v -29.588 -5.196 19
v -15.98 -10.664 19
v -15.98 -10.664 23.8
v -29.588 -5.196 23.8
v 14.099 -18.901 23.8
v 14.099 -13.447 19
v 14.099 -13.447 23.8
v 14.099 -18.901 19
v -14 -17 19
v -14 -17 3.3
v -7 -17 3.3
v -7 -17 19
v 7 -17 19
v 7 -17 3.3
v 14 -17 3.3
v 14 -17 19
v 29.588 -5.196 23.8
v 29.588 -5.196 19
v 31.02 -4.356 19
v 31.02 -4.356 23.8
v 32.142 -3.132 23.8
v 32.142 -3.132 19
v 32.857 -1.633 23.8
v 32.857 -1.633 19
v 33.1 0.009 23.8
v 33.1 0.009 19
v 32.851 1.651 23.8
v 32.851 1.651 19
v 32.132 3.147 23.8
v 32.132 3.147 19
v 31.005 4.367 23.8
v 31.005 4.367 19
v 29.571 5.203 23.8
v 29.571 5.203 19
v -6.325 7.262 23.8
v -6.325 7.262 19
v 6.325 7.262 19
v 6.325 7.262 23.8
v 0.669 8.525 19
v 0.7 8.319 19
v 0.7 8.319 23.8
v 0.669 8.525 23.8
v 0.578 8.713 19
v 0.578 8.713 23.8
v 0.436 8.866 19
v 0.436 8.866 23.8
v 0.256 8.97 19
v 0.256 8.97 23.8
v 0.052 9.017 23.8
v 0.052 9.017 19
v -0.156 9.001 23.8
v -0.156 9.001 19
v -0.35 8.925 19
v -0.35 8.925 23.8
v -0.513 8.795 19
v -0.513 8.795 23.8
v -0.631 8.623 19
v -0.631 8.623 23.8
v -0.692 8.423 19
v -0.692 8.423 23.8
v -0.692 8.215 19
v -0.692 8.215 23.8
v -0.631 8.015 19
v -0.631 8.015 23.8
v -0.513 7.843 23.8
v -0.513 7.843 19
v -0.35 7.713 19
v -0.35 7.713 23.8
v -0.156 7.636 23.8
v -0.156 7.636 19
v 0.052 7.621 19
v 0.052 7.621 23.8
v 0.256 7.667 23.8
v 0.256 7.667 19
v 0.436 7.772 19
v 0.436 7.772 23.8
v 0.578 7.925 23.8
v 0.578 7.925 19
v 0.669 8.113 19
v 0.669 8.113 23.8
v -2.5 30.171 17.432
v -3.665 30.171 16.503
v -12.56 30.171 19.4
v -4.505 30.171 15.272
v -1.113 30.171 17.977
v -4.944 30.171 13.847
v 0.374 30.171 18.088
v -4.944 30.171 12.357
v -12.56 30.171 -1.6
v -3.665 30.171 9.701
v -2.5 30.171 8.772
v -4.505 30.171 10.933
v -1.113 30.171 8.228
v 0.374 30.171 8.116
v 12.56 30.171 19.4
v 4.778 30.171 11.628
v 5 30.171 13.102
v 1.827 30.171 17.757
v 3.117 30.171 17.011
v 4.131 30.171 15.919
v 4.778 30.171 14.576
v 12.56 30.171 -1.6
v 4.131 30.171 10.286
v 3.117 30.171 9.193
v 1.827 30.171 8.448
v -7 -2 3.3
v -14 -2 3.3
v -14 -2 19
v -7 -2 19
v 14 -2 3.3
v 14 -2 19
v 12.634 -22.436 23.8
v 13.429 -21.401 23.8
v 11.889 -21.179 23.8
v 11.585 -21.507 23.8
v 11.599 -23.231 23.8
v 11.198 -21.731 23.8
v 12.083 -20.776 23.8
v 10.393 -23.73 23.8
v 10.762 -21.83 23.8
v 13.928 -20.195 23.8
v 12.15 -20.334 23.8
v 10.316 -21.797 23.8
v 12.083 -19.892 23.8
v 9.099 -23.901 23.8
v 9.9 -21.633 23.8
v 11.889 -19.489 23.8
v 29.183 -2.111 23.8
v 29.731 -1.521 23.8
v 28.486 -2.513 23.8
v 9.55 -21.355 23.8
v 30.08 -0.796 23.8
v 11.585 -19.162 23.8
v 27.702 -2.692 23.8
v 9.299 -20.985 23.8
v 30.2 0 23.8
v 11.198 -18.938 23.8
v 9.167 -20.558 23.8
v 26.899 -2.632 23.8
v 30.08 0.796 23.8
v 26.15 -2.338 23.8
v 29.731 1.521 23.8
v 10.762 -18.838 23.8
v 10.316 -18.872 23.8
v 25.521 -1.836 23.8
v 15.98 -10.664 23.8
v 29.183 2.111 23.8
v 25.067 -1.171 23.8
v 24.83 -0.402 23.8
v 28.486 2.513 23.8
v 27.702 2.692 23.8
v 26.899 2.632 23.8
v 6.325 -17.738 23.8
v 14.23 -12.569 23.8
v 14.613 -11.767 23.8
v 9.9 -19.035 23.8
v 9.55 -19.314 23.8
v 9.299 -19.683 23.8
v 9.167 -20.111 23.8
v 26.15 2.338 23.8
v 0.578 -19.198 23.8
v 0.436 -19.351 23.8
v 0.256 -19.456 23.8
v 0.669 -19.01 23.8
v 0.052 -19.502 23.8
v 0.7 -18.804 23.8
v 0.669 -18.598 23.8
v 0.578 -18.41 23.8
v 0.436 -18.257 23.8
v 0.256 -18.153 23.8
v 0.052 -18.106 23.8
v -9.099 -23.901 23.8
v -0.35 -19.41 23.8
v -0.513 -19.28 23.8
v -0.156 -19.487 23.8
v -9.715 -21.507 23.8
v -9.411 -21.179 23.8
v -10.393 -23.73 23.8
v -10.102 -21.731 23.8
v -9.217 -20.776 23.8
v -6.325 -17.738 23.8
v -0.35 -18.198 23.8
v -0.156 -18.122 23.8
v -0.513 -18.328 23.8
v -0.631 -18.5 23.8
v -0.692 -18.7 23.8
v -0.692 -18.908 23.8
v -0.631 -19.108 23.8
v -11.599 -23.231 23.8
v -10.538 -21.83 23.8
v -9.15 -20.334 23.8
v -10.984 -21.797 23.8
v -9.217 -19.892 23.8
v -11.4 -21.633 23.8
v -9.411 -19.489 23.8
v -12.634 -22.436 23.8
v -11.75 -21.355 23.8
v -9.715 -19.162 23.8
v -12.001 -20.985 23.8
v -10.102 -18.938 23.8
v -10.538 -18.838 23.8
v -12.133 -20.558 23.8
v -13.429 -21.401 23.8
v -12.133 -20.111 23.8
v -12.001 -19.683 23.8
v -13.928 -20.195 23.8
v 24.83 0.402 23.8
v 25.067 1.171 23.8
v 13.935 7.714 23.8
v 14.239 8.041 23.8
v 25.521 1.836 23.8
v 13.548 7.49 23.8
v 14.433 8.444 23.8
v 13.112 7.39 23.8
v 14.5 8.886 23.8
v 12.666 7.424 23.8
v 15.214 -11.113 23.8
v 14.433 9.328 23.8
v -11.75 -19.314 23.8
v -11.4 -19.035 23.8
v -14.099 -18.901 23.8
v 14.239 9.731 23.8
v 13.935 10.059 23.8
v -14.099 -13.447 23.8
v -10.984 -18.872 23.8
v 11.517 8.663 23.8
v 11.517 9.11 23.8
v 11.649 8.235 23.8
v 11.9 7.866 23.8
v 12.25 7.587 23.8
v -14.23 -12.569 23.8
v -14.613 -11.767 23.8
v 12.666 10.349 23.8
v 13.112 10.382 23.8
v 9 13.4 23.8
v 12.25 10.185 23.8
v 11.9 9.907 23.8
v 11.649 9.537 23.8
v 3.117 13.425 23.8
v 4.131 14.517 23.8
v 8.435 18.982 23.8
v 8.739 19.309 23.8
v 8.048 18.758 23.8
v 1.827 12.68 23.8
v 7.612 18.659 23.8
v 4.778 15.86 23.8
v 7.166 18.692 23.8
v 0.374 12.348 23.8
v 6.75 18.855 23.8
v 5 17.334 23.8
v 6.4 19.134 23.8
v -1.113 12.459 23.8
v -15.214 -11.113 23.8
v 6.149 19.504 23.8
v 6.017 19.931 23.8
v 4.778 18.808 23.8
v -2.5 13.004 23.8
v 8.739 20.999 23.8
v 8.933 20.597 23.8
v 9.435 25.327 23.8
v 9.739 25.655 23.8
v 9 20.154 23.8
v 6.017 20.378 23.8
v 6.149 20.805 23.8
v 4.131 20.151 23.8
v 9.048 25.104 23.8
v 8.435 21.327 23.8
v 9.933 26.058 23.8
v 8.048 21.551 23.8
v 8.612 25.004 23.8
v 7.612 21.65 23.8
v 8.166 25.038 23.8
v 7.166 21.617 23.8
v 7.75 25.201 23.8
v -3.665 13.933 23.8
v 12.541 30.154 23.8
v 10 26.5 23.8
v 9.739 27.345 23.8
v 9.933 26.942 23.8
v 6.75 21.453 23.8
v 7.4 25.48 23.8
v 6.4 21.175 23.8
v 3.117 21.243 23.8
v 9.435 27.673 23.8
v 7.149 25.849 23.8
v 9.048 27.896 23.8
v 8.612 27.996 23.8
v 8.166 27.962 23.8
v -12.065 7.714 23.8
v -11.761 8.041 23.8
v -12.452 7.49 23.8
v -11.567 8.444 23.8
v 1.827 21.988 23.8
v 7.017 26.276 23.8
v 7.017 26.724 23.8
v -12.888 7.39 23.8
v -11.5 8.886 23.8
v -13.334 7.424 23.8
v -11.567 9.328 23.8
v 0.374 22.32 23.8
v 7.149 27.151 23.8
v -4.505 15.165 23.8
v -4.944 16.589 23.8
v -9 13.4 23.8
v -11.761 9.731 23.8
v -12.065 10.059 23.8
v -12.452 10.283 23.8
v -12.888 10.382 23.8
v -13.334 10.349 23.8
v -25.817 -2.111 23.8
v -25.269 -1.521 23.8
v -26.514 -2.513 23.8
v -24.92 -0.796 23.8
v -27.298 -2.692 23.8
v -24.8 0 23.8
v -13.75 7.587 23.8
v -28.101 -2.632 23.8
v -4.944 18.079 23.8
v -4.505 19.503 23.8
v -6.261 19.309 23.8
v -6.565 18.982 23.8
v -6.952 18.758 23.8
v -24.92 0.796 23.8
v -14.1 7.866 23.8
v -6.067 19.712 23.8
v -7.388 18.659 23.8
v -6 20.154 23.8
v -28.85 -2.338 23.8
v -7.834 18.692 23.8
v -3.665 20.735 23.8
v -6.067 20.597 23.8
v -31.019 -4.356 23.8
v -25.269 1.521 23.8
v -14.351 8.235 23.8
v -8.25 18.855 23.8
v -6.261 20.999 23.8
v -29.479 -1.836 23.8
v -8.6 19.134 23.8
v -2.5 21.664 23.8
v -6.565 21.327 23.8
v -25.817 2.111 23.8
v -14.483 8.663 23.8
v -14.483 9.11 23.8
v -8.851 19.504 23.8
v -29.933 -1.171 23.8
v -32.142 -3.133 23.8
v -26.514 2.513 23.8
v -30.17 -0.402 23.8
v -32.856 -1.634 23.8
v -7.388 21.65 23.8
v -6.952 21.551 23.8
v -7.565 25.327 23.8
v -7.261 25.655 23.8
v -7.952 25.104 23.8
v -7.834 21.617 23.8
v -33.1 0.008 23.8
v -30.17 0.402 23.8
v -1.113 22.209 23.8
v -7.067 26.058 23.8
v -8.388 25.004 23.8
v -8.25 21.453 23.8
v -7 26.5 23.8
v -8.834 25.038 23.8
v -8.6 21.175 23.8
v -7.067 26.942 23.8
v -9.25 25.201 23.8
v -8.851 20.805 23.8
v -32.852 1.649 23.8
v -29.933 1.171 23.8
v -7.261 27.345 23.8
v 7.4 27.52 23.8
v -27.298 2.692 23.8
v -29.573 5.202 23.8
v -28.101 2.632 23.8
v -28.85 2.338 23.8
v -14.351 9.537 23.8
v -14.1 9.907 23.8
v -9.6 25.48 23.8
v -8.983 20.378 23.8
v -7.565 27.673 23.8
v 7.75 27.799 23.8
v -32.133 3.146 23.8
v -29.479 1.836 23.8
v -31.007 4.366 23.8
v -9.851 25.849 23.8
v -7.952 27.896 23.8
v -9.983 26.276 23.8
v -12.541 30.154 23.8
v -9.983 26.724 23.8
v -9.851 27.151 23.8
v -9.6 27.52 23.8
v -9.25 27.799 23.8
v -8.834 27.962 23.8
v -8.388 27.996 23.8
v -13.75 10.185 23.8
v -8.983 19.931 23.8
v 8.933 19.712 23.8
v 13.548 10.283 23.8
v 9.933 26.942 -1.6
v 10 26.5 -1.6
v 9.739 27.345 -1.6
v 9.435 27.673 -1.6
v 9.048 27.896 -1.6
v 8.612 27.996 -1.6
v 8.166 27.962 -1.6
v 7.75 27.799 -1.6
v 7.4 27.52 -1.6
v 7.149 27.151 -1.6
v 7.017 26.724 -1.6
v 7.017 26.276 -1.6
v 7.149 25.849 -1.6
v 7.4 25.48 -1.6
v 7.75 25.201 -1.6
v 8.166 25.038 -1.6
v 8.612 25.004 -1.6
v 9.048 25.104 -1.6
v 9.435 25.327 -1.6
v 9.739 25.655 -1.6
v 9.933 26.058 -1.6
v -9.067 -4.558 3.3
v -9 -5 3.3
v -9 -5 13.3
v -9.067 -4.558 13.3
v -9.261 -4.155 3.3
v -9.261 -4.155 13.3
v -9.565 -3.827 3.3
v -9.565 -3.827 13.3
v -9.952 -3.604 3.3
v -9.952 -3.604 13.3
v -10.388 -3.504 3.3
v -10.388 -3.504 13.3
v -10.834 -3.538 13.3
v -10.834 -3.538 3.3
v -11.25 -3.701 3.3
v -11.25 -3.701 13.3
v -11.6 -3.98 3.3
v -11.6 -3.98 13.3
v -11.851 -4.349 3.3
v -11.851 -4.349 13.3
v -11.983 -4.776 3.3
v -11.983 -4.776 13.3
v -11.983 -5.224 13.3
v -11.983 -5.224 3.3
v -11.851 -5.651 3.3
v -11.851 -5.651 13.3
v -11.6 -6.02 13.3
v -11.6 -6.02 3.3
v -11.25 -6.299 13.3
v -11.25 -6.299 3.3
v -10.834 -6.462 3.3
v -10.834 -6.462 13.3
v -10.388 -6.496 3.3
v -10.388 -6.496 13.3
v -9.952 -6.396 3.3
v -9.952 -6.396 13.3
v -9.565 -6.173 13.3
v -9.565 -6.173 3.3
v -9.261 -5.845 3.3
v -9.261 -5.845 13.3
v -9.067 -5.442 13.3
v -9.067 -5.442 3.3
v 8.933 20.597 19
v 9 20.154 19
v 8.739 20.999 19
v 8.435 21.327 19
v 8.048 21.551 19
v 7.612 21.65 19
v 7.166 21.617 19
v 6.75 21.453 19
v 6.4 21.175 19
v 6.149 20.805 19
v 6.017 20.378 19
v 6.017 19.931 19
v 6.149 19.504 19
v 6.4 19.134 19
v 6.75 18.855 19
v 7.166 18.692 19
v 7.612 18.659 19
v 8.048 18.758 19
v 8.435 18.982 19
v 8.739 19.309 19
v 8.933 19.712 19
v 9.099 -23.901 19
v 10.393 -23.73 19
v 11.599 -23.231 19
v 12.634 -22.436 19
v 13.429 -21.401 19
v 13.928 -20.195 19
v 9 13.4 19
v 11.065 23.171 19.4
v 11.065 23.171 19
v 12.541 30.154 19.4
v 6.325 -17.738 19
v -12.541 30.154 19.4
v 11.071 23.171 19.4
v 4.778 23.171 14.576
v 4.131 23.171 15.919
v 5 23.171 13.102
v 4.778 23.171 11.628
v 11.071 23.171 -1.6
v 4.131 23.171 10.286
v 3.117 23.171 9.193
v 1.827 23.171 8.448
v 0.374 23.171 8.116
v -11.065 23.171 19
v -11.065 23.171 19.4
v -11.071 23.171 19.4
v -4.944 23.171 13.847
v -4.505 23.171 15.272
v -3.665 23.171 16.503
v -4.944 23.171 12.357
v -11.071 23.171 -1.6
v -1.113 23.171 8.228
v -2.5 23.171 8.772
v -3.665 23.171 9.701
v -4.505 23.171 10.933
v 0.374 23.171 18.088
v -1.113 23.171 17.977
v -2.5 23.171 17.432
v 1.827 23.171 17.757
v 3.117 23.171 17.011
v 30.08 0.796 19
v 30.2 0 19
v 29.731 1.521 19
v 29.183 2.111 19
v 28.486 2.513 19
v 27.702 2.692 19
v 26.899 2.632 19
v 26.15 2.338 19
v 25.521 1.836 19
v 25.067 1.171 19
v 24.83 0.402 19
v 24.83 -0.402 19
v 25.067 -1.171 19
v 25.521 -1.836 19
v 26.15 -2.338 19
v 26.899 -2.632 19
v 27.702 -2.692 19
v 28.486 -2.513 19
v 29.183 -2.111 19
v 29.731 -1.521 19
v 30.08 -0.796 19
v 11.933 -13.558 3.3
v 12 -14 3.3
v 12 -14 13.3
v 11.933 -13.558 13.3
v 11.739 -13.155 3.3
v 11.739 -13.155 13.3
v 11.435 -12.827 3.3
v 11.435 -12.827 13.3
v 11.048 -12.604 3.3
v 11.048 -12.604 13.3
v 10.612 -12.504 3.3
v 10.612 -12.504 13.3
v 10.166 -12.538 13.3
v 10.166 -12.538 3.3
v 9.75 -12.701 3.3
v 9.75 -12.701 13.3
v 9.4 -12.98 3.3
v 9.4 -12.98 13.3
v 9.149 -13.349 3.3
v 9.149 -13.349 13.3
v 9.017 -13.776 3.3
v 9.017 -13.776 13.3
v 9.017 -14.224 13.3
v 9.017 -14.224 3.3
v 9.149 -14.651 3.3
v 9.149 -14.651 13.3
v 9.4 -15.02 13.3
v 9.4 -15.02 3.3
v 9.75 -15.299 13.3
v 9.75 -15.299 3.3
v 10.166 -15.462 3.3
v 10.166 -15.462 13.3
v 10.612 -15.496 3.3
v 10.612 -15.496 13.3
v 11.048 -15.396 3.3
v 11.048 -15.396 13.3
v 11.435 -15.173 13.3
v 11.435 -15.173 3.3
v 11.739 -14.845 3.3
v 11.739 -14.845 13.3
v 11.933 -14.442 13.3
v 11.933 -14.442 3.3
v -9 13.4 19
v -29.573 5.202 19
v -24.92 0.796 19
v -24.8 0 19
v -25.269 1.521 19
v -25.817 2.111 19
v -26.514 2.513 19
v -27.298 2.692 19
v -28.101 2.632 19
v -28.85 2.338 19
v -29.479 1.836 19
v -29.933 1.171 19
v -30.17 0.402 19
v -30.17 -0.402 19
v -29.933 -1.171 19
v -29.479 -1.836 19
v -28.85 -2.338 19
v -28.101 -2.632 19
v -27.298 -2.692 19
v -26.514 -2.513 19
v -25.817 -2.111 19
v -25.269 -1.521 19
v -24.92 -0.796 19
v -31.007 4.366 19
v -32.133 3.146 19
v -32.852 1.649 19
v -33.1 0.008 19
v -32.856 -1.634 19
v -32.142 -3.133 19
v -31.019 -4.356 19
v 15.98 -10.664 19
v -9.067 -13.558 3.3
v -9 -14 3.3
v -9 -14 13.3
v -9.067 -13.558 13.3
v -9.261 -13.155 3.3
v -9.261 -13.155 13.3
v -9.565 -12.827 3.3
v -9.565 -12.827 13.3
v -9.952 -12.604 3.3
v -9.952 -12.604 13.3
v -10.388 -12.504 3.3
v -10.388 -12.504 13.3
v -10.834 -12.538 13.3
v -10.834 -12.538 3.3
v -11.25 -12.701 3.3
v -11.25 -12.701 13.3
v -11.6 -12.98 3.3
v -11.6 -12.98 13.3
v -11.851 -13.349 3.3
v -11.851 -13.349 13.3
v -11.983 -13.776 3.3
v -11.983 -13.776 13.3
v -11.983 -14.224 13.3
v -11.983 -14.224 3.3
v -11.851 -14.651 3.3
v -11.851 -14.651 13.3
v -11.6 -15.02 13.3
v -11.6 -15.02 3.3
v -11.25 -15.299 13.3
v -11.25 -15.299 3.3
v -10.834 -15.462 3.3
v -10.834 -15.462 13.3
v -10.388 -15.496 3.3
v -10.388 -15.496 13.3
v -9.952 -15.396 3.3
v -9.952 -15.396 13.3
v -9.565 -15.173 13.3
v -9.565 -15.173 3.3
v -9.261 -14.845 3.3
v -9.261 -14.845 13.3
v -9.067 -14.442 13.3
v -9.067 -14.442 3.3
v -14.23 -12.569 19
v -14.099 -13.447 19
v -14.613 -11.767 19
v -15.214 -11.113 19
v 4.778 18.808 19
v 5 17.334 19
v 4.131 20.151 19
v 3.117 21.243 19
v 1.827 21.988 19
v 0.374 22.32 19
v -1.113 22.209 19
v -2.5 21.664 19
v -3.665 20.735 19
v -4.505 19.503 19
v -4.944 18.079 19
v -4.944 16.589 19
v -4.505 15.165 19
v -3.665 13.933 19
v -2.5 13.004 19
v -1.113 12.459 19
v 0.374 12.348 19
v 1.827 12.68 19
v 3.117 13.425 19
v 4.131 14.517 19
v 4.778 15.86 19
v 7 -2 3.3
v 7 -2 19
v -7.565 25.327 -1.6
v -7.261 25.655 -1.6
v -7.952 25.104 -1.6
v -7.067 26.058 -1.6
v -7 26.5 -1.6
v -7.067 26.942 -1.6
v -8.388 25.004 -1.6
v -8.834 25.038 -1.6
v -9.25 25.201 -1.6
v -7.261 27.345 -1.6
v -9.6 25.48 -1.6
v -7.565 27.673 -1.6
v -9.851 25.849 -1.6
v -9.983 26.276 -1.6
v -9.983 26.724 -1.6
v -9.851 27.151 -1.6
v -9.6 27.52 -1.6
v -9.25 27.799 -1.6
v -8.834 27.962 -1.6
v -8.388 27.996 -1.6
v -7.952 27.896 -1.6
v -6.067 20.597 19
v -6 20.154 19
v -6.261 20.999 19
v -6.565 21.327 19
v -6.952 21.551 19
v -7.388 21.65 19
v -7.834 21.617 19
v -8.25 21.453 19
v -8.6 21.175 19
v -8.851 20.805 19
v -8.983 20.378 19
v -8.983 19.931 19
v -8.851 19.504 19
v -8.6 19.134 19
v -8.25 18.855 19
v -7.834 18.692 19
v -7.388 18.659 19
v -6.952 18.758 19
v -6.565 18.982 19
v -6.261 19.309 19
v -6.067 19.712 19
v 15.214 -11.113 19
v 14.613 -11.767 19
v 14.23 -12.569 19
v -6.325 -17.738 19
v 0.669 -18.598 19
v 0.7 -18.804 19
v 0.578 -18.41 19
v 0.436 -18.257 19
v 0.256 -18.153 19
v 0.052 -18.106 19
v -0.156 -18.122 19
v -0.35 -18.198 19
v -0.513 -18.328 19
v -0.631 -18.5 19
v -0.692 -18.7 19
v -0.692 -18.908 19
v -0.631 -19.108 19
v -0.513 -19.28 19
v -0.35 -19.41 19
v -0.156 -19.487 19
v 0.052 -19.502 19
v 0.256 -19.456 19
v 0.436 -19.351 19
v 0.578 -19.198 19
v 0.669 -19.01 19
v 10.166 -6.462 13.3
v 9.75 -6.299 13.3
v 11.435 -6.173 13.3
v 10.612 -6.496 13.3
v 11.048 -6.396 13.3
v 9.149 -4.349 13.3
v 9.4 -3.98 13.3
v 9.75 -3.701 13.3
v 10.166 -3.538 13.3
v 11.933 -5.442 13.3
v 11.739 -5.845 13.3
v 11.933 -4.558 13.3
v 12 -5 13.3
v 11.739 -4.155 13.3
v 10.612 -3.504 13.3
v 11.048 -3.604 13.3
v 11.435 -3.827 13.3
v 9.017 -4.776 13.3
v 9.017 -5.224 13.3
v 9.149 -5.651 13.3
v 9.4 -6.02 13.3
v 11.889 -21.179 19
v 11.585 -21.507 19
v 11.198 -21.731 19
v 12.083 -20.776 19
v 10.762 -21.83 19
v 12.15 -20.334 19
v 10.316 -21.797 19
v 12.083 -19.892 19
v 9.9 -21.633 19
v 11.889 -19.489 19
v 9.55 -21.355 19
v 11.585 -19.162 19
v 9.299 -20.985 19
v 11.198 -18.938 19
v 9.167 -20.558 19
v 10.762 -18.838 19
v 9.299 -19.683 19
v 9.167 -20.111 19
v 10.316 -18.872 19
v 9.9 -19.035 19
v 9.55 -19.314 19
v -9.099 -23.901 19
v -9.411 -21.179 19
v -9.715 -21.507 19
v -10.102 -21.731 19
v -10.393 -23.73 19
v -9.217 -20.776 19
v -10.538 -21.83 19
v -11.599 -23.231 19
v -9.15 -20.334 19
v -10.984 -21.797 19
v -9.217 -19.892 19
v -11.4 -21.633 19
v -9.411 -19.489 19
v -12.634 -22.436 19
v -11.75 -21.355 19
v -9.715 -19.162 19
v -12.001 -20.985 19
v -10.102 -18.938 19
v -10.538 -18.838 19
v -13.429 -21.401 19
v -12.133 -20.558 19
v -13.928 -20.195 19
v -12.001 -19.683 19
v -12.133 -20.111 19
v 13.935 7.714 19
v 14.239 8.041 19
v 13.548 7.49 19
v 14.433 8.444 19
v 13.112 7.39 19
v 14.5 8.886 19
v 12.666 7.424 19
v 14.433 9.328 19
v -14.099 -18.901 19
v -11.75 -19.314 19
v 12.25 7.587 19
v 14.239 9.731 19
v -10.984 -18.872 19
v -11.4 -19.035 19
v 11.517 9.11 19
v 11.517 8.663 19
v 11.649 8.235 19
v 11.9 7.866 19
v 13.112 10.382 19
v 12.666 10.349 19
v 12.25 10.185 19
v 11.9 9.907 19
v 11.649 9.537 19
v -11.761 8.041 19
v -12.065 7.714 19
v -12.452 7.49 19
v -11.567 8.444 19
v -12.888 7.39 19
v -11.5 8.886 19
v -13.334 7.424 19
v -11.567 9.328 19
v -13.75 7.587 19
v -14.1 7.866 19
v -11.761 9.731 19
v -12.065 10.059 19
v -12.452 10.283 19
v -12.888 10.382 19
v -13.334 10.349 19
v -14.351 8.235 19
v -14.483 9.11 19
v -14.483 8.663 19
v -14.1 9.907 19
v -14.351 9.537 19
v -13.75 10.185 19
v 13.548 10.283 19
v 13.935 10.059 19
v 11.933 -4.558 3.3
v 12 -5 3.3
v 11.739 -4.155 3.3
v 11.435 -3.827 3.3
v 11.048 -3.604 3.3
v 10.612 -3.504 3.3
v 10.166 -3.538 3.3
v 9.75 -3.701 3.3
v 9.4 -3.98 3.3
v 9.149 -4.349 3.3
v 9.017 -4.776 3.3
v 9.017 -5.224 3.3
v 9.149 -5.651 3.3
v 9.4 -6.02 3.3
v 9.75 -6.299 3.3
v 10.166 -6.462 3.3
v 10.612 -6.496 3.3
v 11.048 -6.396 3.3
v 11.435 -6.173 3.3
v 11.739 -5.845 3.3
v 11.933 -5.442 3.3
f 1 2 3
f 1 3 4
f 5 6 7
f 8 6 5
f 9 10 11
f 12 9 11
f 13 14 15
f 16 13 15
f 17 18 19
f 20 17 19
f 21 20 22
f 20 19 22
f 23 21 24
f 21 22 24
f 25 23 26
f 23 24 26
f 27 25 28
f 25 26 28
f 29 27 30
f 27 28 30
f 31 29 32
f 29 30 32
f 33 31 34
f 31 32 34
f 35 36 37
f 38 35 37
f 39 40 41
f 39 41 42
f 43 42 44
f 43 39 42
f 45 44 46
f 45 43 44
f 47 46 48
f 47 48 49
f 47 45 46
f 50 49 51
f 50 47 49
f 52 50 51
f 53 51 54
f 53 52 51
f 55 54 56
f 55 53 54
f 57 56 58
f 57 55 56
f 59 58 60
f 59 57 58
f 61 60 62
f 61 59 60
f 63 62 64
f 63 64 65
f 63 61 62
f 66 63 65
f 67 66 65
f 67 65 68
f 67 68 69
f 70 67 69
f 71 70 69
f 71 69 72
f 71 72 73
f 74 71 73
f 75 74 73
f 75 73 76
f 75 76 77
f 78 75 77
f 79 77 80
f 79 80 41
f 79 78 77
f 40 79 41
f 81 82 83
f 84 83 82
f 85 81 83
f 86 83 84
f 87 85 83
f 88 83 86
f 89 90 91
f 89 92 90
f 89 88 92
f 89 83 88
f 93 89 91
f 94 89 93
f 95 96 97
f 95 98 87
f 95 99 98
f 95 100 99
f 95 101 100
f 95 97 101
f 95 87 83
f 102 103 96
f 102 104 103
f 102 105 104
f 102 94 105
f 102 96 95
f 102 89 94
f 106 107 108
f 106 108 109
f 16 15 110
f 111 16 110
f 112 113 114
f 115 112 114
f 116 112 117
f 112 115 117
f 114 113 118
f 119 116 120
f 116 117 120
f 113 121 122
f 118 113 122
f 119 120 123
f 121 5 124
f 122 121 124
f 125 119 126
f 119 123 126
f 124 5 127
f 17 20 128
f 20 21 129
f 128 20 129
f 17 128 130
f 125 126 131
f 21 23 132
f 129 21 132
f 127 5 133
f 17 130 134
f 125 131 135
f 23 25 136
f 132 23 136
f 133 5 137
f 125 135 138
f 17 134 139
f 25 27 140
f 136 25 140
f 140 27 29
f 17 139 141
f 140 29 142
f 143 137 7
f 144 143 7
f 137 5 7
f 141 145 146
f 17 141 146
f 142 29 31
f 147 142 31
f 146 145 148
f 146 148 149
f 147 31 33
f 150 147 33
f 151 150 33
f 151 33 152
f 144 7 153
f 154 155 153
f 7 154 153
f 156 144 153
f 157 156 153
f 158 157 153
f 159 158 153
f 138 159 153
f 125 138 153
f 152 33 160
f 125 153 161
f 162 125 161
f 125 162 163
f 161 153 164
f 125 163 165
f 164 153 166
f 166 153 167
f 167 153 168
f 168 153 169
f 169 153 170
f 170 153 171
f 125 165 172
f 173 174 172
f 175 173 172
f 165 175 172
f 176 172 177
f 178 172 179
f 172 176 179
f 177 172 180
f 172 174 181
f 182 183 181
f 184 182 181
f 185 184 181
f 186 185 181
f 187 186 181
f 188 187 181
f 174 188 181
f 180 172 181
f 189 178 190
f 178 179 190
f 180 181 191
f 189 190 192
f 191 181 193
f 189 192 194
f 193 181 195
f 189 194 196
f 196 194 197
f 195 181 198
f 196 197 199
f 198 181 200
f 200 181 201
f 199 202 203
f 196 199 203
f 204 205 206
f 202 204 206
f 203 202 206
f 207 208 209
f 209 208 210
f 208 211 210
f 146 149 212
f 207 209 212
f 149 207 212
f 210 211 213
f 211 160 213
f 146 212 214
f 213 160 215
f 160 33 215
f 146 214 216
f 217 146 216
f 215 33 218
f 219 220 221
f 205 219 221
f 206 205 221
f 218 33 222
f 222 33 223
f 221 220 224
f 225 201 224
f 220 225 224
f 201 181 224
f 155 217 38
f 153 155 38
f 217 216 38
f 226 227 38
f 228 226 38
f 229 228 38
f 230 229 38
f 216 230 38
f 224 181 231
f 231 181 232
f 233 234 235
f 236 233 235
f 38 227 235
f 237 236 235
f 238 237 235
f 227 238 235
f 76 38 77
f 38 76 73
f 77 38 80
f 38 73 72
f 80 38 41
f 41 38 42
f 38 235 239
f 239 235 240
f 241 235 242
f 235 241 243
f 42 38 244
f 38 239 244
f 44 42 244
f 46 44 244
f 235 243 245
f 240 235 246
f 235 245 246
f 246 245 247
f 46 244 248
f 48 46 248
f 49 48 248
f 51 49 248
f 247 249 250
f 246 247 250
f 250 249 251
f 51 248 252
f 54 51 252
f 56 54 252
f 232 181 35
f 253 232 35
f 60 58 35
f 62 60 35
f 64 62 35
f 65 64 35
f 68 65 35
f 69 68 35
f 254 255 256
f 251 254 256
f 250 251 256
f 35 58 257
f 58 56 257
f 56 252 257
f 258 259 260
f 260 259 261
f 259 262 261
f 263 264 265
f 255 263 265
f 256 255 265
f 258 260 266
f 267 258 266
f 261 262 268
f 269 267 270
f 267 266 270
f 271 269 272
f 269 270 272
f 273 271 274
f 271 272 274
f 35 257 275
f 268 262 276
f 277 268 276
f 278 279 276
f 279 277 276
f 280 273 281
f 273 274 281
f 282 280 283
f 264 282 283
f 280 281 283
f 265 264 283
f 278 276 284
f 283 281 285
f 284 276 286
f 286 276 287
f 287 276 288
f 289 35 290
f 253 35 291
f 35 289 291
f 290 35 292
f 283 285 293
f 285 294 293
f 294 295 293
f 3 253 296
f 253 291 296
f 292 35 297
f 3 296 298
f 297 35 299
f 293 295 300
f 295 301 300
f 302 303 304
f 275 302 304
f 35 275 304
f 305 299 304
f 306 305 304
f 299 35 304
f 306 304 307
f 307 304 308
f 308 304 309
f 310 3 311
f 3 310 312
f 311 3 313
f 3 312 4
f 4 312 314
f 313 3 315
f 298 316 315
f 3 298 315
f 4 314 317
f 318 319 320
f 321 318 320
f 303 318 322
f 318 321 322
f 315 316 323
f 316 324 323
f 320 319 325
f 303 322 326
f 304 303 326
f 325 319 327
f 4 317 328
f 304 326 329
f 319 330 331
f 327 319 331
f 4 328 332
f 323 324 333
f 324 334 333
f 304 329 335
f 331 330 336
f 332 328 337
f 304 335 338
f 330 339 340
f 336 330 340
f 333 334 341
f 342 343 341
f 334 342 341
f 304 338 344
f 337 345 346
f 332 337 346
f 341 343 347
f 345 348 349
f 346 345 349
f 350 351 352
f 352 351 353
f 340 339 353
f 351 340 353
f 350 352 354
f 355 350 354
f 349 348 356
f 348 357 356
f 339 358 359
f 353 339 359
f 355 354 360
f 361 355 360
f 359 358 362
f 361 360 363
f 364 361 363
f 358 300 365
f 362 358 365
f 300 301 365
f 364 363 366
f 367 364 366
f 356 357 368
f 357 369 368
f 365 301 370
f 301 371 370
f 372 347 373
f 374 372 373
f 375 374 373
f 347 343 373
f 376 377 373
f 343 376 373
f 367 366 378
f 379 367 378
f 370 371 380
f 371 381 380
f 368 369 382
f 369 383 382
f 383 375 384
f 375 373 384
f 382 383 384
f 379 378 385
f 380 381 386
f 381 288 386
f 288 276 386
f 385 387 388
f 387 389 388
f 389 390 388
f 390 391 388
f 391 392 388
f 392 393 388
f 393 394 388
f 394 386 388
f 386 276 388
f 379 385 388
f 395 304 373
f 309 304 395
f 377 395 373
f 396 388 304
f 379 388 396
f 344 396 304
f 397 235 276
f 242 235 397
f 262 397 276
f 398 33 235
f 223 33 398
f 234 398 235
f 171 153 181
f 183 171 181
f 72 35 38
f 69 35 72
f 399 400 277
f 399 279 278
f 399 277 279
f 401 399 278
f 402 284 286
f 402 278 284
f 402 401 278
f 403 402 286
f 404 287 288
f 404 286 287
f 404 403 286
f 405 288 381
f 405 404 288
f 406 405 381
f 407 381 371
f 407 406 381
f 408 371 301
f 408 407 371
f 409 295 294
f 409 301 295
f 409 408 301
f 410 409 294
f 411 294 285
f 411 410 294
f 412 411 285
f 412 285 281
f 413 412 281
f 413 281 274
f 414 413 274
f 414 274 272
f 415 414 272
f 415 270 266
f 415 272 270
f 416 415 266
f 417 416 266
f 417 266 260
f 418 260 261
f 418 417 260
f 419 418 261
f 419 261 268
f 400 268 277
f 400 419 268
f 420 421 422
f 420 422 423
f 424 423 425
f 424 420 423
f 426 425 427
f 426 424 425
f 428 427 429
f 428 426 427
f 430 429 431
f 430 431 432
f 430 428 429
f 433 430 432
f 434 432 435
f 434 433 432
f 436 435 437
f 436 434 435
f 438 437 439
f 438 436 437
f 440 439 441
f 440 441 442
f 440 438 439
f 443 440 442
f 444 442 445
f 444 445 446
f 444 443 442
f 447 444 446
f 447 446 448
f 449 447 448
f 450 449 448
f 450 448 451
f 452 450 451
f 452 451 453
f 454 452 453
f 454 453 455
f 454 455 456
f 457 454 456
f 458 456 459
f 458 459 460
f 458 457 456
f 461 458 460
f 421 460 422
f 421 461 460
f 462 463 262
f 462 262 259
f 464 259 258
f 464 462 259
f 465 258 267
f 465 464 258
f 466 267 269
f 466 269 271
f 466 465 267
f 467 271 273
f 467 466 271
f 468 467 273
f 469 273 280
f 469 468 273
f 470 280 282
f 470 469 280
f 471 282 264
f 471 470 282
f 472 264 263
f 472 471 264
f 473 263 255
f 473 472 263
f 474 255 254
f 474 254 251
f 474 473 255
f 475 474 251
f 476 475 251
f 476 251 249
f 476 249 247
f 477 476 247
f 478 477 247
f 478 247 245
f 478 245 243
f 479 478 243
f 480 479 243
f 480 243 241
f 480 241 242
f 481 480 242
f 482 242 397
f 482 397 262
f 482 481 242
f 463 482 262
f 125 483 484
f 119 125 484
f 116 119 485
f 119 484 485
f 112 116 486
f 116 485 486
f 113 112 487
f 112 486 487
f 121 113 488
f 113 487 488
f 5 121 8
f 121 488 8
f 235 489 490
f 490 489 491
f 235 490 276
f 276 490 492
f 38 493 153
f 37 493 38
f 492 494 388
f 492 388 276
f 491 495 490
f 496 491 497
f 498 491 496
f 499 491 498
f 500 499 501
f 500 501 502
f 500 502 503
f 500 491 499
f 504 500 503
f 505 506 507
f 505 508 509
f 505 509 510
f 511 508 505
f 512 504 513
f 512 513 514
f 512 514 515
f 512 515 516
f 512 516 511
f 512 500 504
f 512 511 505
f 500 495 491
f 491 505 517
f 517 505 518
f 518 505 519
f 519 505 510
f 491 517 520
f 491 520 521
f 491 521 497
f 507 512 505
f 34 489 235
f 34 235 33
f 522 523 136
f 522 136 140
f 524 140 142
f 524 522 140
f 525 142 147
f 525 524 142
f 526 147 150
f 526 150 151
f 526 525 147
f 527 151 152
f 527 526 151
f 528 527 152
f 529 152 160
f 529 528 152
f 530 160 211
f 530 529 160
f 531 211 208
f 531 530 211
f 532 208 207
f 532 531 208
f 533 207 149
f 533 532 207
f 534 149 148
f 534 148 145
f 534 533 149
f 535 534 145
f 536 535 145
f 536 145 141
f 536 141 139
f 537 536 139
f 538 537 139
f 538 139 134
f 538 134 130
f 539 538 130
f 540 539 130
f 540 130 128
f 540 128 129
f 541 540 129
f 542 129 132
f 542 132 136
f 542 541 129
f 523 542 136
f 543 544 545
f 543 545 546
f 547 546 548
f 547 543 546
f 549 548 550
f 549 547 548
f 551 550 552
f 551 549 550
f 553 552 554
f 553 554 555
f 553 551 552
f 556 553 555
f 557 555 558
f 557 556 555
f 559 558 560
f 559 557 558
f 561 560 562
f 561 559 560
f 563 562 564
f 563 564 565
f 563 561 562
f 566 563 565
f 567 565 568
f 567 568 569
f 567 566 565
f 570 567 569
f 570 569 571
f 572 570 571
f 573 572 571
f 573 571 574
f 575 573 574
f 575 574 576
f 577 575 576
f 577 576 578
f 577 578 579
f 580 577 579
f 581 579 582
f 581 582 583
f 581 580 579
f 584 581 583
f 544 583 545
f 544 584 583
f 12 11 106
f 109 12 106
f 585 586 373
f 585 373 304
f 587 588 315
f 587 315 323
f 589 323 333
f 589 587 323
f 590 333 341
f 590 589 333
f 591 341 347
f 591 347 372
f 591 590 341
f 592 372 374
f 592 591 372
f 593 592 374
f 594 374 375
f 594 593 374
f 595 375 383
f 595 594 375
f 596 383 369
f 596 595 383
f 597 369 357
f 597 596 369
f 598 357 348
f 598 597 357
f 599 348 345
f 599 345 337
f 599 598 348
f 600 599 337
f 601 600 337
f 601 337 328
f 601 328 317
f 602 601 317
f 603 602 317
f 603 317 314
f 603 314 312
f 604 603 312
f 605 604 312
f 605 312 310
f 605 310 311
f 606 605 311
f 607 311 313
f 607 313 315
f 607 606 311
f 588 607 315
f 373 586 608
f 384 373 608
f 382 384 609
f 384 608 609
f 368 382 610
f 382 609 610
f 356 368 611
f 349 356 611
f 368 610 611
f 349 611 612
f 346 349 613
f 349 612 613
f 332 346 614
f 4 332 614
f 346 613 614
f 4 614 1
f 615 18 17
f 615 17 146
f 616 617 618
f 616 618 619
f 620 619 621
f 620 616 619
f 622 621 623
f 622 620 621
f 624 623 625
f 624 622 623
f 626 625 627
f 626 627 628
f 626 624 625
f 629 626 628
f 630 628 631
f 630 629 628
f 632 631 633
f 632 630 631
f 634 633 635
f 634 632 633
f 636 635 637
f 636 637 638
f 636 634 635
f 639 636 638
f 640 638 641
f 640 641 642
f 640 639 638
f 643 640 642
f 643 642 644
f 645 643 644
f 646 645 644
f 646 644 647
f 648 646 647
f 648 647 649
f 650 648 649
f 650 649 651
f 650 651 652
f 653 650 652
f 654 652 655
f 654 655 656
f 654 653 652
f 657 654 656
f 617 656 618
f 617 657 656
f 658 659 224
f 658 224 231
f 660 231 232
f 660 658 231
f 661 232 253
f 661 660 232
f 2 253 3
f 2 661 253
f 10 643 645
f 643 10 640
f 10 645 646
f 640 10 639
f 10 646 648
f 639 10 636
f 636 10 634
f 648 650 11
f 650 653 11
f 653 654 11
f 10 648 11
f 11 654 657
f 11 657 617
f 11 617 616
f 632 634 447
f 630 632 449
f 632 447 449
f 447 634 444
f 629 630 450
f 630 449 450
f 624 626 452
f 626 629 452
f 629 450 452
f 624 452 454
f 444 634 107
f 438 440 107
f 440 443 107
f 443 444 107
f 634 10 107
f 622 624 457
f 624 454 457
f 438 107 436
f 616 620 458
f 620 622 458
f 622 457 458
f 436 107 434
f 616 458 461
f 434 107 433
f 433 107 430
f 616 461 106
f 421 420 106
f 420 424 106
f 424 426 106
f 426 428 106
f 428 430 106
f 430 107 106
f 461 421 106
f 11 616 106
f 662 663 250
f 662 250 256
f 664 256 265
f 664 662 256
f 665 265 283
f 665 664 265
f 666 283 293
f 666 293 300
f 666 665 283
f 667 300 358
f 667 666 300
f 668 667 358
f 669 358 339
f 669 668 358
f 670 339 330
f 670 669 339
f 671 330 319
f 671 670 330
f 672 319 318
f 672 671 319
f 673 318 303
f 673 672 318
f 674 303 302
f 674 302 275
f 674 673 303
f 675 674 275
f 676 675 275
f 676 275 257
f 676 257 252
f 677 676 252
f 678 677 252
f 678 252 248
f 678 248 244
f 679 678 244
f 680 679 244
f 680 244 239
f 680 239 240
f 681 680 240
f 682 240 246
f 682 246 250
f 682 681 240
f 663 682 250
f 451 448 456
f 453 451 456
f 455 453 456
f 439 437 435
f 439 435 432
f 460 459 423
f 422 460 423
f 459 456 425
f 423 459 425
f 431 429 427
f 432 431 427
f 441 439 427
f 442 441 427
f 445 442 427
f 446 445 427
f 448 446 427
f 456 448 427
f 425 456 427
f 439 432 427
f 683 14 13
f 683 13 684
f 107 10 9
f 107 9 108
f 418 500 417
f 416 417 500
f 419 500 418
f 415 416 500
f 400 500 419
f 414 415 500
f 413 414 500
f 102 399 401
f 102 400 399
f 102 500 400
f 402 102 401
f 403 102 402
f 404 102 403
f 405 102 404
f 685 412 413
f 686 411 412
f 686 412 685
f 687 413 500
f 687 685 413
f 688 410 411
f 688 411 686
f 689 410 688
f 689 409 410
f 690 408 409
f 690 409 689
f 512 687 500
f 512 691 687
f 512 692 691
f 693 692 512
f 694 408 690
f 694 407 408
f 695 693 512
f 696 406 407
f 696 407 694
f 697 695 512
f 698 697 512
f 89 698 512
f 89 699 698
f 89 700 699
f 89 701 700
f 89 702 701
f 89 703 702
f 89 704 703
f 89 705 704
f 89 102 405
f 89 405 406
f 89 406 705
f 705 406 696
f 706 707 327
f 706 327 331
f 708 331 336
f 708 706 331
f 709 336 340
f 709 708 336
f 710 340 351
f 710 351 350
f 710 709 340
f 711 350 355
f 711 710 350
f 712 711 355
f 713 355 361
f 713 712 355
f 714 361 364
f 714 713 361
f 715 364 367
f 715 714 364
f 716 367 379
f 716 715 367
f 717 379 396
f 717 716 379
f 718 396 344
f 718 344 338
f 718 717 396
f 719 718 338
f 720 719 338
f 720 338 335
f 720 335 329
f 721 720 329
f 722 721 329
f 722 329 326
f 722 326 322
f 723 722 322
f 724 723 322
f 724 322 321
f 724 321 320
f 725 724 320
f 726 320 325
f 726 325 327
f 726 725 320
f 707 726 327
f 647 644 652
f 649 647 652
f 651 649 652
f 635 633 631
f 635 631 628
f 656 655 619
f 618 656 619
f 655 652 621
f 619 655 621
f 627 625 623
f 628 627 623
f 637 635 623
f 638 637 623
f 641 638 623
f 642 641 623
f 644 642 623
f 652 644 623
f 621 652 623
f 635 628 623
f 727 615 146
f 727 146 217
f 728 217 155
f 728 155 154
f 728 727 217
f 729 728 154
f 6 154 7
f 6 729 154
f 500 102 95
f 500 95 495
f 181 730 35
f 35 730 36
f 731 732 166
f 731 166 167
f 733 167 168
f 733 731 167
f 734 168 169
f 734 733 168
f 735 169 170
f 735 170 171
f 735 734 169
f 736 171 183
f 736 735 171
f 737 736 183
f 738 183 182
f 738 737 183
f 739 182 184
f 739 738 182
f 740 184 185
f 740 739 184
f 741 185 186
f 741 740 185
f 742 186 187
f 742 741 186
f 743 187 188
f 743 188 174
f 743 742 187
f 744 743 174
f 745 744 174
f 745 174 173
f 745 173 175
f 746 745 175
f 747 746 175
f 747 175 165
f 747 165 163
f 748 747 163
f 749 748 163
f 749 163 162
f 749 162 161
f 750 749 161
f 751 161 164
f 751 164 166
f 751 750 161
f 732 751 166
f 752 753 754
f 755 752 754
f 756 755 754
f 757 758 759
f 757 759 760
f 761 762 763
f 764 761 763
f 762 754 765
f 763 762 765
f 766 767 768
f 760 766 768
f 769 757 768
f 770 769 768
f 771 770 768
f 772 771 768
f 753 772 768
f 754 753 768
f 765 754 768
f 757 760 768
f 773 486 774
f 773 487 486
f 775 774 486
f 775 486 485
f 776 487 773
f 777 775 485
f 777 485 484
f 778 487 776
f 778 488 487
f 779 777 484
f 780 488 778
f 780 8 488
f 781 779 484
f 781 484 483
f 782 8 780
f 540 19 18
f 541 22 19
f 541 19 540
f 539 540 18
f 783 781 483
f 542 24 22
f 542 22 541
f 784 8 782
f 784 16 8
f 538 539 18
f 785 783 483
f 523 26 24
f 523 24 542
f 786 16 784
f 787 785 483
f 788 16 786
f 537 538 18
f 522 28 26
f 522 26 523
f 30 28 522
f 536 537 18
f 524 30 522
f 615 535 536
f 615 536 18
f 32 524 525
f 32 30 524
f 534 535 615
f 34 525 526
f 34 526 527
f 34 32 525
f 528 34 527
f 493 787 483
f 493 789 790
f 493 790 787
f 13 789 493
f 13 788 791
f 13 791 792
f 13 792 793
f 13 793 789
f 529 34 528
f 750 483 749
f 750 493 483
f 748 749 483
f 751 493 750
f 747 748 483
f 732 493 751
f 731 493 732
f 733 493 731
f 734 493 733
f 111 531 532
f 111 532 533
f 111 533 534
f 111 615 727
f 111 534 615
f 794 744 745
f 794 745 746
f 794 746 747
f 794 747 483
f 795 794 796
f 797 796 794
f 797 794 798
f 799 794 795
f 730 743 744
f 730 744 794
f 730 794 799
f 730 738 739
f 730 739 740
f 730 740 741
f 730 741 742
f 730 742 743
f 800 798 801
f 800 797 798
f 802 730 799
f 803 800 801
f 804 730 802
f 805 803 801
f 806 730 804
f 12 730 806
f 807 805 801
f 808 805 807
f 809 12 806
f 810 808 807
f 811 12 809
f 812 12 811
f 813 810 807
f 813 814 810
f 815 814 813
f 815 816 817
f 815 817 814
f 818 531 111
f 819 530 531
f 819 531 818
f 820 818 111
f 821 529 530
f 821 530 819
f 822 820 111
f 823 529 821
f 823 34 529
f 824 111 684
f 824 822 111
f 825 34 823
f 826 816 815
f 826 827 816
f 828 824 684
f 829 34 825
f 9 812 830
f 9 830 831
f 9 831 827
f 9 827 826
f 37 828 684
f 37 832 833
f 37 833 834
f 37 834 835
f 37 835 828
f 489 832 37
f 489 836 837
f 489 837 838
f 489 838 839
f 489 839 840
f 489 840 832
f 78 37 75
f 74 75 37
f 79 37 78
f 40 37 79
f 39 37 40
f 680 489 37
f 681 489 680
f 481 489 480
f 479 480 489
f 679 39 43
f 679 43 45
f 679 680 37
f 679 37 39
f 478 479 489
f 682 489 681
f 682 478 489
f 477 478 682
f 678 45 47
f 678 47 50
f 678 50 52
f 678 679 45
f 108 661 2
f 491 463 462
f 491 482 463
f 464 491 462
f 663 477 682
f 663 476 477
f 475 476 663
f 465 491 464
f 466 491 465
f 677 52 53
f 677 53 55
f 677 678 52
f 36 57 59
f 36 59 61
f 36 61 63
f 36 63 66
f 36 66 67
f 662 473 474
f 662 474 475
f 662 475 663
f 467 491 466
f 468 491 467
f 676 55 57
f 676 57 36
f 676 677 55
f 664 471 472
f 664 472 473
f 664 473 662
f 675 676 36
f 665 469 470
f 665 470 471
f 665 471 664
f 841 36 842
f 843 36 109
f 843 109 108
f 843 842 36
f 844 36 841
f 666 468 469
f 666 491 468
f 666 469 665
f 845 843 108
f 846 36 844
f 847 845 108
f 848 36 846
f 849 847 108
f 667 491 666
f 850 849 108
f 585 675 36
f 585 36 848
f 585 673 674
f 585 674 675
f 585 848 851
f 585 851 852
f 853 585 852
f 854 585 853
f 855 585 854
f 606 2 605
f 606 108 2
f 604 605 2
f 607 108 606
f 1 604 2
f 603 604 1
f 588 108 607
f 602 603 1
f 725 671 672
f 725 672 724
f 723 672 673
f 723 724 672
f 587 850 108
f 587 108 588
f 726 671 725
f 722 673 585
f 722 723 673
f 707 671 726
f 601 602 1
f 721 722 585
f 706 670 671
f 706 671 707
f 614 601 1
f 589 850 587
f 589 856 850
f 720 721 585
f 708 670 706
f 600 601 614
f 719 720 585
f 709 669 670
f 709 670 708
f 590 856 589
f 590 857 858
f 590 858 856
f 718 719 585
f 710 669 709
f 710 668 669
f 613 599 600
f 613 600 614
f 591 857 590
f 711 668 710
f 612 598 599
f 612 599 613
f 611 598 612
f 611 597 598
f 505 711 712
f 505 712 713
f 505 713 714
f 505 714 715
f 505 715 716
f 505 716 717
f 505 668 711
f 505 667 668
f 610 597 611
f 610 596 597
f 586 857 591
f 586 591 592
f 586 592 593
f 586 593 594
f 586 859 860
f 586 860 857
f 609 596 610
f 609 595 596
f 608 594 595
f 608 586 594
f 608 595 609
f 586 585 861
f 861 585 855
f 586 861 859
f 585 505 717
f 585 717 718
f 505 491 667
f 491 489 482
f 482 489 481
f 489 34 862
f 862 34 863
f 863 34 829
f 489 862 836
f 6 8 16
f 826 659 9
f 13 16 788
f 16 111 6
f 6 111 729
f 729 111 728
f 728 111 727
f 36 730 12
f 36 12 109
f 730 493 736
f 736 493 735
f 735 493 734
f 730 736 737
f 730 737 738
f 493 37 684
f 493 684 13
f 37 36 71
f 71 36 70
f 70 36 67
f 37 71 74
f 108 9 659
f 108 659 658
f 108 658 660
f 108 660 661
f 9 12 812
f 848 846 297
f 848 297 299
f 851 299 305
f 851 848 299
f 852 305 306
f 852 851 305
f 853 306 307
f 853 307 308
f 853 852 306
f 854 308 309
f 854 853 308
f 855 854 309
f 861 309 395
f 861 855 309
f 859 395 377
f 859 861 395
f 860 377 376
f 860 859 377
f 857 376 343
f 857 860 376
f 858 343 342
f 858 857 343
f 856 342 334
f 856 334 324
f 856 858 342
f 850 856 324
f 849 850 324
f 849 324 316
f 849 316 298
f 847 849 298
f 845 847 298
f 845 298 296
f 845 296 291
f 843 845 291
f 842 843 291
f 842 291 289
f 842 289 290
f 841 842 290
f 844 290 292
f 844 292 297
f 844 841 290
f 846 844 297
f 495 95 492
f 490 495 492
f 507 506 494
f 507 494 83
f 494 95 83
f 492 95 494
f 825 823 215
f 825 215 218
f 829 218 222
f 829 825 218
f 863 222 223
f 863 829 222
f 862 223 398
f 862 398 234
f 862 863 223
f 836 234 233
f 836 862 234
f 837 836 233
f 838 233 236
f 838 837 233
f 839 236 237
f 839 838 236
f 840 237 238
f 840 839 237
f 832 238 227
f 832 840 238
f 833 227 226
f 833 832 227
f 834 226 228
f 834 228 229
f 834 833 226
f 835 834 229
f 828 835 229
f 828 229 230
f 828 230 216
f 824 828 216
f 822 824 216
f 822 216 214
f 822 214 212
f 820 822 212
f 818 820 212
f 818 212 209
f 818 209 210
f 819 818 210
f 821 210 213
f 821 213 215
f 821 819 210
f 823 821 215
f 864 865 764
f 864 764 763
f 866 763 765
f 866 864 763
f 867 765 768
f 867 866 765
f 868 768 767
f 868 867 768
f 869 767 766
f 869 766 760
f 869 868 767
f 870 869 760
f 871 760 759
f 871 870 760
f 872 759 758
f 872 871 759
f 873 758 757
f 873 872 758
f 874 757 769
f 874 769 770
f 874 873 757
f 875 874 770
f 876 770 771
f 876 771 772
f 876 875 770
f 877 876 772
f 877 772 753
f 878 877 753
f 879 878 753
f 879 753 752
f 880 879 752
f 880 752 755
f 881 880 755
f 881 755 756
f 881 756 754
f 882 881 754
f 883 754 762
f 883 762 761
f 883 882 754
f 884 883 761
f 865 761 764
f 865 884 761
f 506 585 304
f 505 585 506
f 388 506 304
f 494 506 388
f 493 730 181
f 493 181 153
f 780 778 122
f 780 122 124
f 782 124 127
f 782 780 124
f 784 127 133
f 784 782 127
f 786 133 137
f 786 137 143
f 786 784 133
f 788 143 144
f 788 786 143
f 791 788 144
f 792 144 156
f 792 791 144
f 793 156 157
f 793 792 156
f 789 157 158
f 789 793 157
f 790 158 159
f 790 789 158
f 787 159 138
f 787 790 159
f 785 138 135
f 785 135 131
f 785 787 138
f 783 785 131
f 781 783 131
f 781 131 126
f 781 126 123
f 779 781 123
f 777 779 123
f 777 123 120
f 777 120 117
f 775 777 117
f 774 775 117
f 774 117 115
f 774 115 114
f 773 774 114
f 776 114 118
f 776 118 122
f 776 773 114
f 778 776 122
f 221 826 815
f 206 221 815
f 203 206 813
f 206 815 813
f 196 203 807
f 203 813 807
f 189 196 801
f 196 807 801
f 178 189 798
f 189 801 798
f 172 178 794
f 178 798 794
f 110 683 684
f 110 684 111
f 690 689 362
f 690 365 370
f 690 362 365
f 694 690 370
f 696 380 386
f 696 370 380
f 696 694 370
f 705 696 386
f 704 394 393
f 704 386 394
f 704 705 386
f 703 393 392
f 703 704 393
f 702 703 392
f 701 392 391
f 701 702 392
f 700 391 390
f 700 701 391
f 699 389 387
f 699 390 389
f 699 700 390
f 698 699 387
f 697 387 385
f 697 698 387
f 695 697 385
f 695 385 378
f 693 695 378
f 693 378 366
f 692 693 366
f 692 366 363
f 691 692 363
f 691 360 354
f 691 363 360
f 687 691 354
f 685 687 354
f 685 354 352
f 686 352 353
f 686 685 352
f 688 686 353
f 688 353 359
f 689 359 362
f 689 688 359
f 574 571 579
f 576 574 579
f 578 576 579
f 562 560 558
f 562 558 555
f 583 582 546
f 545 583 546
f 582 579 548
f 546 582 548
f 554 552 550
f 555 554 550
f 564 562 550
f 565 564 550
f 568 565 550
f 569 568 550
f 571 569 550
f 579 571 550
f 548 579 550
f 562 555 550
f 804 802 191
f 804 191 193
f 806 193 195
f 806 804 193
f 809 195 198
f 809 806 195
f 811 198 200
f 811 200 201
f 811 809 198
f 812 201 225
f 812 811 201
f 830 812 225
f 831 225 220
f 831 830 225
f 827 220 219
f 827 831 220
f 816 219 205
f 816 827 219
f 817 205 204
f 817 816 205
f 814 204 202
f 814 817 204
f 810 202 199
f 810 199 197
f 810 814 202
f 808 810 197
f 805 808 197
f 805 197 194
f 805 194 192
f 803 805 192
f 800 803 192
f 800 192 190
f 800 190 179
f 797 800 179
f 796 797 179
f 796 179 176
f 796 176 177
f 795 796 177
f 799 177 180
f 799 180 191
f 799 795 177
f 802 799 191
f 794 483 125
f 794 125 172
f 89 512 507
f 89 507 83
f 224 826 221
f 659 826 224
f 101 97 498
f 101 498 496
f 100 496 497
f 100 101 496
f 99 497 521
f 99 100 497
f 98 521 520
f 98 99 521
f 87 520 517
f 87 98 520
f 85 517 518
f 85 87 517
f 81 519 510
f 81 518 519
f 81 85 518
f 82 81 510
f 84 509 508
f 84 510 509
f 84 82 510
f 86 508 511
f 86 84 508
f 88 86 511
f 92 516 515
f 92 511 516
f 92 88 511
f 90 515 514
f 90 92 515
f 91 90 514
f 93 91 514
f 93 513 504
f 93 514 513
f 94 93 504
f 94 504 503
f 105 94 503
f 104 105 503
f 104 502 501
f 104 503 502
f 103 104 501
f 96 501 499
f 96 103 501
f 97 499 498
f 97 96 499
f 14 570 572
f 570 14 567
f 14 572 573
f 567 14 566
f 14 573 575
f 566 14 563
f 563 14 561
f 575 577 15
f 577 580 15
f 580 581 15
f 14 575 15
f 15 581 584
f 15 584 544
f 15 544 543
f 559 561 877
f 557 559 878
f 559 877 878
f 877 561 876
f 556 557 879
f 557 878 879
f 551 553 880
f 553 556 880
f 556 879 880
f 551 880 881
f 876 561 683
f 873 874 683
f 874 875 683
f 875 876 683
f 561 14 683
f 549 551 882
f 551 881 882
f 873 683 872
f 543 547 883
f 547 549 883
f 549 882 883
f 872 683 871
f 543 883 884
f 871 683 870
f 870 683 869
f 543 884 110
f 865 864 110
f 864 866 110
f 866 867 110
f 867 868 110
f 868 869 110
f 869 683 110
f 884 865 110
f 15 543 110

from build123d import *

# Parameters (mm, degrees)
CYLINDER043_R     = 1.5
CYLINDER043_DEPTH = 27
CYLINDER042_R     = 1.5
CYLINDER042_DEPTH = 27
SKETCH012_R       = 5
PAD007_DEPTH      = 30
CYLINDER029_R     = 1.5
CYLINDER029_DEPTH = 10
CYLINDER030_R     = 1.5
CYLINDER030_DEPTH = 10
CYLINDER031_R     = 1.5
CYLINDER031_DEPTH = 10
CYLINDER032_R     = 1.5
CYLINDER032_DEPTH = 11
CYLINDER033_R     = 1.5
CYLINDER033_DEPTH = 11
CYLINDER028_R     = 1.5
CYLINDER028_DEPTH = 10
BOX007_W          = 7
BOX007_H          = 15
BOX007_DEPTH      = 18
PAD006_DEPTH      = 21
BOX006_W          = 7
BOX006_H          = 15
BOX006_DEPTH      = 18
SKETCH016_R       = 2.7
SKETCH016_R_2     = 1.5
SKETCH016_R_3     = 5
SKETCH016_R_4     = 0.7
SKETCH016_W       = 12.65
SKETCH016_H       = 25
PAD009_DEPTH      = 4.8


with BuildPart() as taladro016:
    # Cylinder043 → Cylinder043 (new body)
    with BuildSketch(Plane(origin=(8.5, 26.5, -1.7), x_dir=(1, 0, 0), z_dir=(0, 0, 1))):
        Circle(CYLINDER043_R)
    extrude(amount=CYLINDER043_DEPTH)


with BuildPart() as seg_taladros_a:
    # Cylinder042 → Cylinder042 (new body)
    with BuildSketch(Plane(origin=(-8.5, 26.5, -1.7), x_dir=(1, 0, 0), z_dir=(0, 0, 1))):
        Circle(CYLINDER042_R)
    extrude(amount=CYLINDER042_DEPTH)

    # Fusion021: union Taladro016
    add(taladro016.part)


with BuildPart() as taladro_8mm:
    # Sketch012 → Pad007 (new body)
    with BuildSketch(Plane(origin=(0, 38, 3), x_dir=(1, 0, 0), z_dir=(0, -1, 0))):
        with Locations((0, 10.102227)):
            Circle(SKETCH012_R)
    extrude(amount=PAD007_DEPTH)


with BuildPart() as taladro002:
    # Cylinder029 → Cylinder029 (new body)
    with BuildSketch(Plane(origin=(-10.5, -14, 2.3), x_dir=(1, 0, 0), z_dir=(0, 0, 1))):
        Circle(CYLINDER029_R)
    extrude(amount=CYLINDER029_DEPTH)


with BuildPart() as taladro003:
    # Cylinder030 → Cylinder030 (new body)
    with BuildSketch(Plane(origin=(10.5, -5, 2.3), x_dir=(1, 0, 0), z_dir=(0, 0, 1))):
        Circle(CYLINDER030_R)
    extrude(amount=CYLINDER030_DEPTH)


with BuildPart() as taladro004:
    # Cylinder031 → Cylinder031 (new body)
    with BuildSketch(Plane(origin=(10.5, -14, 2.3), x_dir=(1, 0, 0), z_dir=(0, 0, 1))):
        Circle(CYLINDER031_R)
    extrude(amount=CYLINDER031_DEPTH)


with BuildPart() as taladro005:
    # Cylinder032 → Cylinder032 (new body)
    with BuildSketch(Plane(origin=(-8.5, 26.5, -1.7), x_dir=(1, 0, 0), z_dir=(0, 0, 1))):
        Circle(CYLINDER032_R)
    extrude(amount=CYLINDER032_DEPTH)


with BuildPart() as taladro006:
    # Cylinder033 → Cylinder033 (new body)
    with BuildSketch(Plane(origin=(8.5, 26.5, -1.7), x_dir=(1, 0, 0), z_dir=(0, 0, 1))):
        Circle(CYLINDER033_R)
    extrude(amount=CYLINDER033_DEPTH)


with BuildPart() as taladros_a:
    # Cylinder028 → Cylinder028 (new body)
    with BuildSketch(Plane(origin=(-10.5, -5, 2.3), x_dir=(1, 0, 0), z_dir=(0, 0, 1))):
        Circle(CYLINDER028_R)
    extrude(amount=CYLINDER028_DEPTH)

    # Fusion014: union Taladro002, Taladro003, Taladro004, Taladro005, Taladro006
    add(taladro002.part)
    add(taladro003.part)
    add(taladro004.part)
    add(taladro005.part)
    add(taladro006.part)


with BuildPart() as taladros_a_1:
    # Fusion014 placement: moved
    add(taladros_a.part.moved(Location((0, 0, 1))))


with BuildPart() as cubo007:
    # Box007 → Box007 (new body)
    with BuildSketch(Plane(origin=(7, -17, 3.3), x_dir=(1, 0, 0), z_dir=(0, 0, 1))):
        with Locations((3.5, 7.5)):
            Rectangle(BOX007_W, BOX007_H)
    extrude(amount=BOX007_DEPTH)


with BuildPart() as pad006:
    # Sketch011 → Pad006 (new body)
    with BuildSketch(Plane.XY.offset(-1.6)):
        Polygon((-12.559899, 30.171141), (12.559899, 30.171141), (11.070948, 23.171141), (-11.070948, 23.171141), align=None)
    extrude(amount=PAD006_DEPTH)


with BuildPart() as cut009:
    # Box006 → Box006 (new body)
    with BuildSketch(Plane(origin=(-14, -17, 3.3), x_dir=(1, 0, 0), z_dir=(0, 0, 1))):
        with Locations((3.5, 7.5)):
            Rectangle(BOX006_W, BOX006_H)
    extrude(amount=BOX006_DEPTH)

    # Fusion016: union Cubo007, Pad006
    add(cubo007.part)
    add(pad006.part)

    # Cut007: cut Taladros A
    add(taladros_a_1.part, mode=Mode.SUBTRACT)

    # Cut009: cut Taladro 8mm
    add(taladro_8mm.part, mode=Mode.SUBTRACT)


with BuildPart() as cut010:
    # Sketch016 → Pad009 (new body)
    with BuildSketch(Plane.XY.offset(19)):
        with BuildLine():
            Line((-29.572856, 5.202237), (-9, 13.39959))
            Line((-9, 13.39959), (-12.540941, 30.154421))
            Line((-12.540941, 30.154421), (12.540941, 30.154421))
            Line((9, 13.39959), (12.540941, 30.154421))
            Line((9, 13.39959), (29.570667, 5.203109))
            ThreePointArc((29.587798, -5.196258), (33.099992, 0.009225), (29.570667, 5.203109))
            Line((29.587798, -5.196258), (15.980248, -10.663617))
            ThreePointArc((15.980248, -10.663617), (14.613214, -11.767355), (14.098711, -13.447327))
            Line((14.098711, -13.447327), (14.098711, -18.900571))
            ThreePointArc((9.098711, -23.900571), (12.634245, -22.436105), (14.098711, -18.900571))
            Line((9.098711, -23.900571), (-9.098711, -23.900571))
            ThreePointArc((-14.098711, -18.900571), (-12.634245, -22.436105), (-9.098711, -23.900571))
            Line((-14.098711, -18.900571), (-14.098711, -13.447327))
            ThreePointArc((-14.098711, -13.447327), (-14.613214, -11.767355), (-15.980248, -10.663617))
            Line((-15.980248, -10.663617), (-29.587798, -5.196258))
            ThreePointArc((-29.572856, 5.202237), (-33.099994, 0.008047), (-29.587798, -5.196258))
        make_face()
        with Locations((27.5, 0)):
            Circle(SKETCH016_R, mode=Mode.SUBTRACT)
        with Locations((-27.5, 0)):
            Circle(SKETCH016_R, mode=Mode.SUBTRACT)
        with Locations((10.65, -20.334303)):
            Circle(SKETCH016_R_2, mode=Mode.SUBTRACT)
        with Locations((-10.65, -20.334303)):
            Circle(SKETCH016_R_2, mode=Mode.SUBTRACT)
        with Locations((13, 8.886284)):
            Circle(SKETCH016_R_2, mode=Mode.SUBTRACT)
        with Locations((-13, 8.886284)):
            Circle(SKETCH016_R_2, mode=Mode.SUBTRACT)
        with Locations((7.5, 20.154421)):
            Circle(SKETCH016_R_2, mode=Mode.SUBTRACT)
        with Locations((-7.5, 20.154421)):
            Circle(SKETCH016_R_2, mode=Mode.SUBTRACT)
        with Locations((0, 17.333948)):
            Circle(SKETCH016_R_3, mode=Mode.SUBTRACT)
        with Locations((0, 8.318832)):
            Circle(SKETCH016_R_4, mode=Mode.SUBTRACT)
        with Locations((0, -18.804168)):
            Circle(SKETCH016_R_4, mode=Mode.SUBTRACT)
        with Locations((0, -5.238349)):
            Rectangle(SKETCH016_W, SKETCH016_H, mode=Mode.SUBTRACT)
    extrude(amount=PAD009_DEPTH)

    # Fusion020: union Cut009
    add(cut009.part)

    # Cut010: cut Seg taladros A
    add(seg_taladros_a.part, mode=Mode.SUBTRACT)


solid = cut010.part
